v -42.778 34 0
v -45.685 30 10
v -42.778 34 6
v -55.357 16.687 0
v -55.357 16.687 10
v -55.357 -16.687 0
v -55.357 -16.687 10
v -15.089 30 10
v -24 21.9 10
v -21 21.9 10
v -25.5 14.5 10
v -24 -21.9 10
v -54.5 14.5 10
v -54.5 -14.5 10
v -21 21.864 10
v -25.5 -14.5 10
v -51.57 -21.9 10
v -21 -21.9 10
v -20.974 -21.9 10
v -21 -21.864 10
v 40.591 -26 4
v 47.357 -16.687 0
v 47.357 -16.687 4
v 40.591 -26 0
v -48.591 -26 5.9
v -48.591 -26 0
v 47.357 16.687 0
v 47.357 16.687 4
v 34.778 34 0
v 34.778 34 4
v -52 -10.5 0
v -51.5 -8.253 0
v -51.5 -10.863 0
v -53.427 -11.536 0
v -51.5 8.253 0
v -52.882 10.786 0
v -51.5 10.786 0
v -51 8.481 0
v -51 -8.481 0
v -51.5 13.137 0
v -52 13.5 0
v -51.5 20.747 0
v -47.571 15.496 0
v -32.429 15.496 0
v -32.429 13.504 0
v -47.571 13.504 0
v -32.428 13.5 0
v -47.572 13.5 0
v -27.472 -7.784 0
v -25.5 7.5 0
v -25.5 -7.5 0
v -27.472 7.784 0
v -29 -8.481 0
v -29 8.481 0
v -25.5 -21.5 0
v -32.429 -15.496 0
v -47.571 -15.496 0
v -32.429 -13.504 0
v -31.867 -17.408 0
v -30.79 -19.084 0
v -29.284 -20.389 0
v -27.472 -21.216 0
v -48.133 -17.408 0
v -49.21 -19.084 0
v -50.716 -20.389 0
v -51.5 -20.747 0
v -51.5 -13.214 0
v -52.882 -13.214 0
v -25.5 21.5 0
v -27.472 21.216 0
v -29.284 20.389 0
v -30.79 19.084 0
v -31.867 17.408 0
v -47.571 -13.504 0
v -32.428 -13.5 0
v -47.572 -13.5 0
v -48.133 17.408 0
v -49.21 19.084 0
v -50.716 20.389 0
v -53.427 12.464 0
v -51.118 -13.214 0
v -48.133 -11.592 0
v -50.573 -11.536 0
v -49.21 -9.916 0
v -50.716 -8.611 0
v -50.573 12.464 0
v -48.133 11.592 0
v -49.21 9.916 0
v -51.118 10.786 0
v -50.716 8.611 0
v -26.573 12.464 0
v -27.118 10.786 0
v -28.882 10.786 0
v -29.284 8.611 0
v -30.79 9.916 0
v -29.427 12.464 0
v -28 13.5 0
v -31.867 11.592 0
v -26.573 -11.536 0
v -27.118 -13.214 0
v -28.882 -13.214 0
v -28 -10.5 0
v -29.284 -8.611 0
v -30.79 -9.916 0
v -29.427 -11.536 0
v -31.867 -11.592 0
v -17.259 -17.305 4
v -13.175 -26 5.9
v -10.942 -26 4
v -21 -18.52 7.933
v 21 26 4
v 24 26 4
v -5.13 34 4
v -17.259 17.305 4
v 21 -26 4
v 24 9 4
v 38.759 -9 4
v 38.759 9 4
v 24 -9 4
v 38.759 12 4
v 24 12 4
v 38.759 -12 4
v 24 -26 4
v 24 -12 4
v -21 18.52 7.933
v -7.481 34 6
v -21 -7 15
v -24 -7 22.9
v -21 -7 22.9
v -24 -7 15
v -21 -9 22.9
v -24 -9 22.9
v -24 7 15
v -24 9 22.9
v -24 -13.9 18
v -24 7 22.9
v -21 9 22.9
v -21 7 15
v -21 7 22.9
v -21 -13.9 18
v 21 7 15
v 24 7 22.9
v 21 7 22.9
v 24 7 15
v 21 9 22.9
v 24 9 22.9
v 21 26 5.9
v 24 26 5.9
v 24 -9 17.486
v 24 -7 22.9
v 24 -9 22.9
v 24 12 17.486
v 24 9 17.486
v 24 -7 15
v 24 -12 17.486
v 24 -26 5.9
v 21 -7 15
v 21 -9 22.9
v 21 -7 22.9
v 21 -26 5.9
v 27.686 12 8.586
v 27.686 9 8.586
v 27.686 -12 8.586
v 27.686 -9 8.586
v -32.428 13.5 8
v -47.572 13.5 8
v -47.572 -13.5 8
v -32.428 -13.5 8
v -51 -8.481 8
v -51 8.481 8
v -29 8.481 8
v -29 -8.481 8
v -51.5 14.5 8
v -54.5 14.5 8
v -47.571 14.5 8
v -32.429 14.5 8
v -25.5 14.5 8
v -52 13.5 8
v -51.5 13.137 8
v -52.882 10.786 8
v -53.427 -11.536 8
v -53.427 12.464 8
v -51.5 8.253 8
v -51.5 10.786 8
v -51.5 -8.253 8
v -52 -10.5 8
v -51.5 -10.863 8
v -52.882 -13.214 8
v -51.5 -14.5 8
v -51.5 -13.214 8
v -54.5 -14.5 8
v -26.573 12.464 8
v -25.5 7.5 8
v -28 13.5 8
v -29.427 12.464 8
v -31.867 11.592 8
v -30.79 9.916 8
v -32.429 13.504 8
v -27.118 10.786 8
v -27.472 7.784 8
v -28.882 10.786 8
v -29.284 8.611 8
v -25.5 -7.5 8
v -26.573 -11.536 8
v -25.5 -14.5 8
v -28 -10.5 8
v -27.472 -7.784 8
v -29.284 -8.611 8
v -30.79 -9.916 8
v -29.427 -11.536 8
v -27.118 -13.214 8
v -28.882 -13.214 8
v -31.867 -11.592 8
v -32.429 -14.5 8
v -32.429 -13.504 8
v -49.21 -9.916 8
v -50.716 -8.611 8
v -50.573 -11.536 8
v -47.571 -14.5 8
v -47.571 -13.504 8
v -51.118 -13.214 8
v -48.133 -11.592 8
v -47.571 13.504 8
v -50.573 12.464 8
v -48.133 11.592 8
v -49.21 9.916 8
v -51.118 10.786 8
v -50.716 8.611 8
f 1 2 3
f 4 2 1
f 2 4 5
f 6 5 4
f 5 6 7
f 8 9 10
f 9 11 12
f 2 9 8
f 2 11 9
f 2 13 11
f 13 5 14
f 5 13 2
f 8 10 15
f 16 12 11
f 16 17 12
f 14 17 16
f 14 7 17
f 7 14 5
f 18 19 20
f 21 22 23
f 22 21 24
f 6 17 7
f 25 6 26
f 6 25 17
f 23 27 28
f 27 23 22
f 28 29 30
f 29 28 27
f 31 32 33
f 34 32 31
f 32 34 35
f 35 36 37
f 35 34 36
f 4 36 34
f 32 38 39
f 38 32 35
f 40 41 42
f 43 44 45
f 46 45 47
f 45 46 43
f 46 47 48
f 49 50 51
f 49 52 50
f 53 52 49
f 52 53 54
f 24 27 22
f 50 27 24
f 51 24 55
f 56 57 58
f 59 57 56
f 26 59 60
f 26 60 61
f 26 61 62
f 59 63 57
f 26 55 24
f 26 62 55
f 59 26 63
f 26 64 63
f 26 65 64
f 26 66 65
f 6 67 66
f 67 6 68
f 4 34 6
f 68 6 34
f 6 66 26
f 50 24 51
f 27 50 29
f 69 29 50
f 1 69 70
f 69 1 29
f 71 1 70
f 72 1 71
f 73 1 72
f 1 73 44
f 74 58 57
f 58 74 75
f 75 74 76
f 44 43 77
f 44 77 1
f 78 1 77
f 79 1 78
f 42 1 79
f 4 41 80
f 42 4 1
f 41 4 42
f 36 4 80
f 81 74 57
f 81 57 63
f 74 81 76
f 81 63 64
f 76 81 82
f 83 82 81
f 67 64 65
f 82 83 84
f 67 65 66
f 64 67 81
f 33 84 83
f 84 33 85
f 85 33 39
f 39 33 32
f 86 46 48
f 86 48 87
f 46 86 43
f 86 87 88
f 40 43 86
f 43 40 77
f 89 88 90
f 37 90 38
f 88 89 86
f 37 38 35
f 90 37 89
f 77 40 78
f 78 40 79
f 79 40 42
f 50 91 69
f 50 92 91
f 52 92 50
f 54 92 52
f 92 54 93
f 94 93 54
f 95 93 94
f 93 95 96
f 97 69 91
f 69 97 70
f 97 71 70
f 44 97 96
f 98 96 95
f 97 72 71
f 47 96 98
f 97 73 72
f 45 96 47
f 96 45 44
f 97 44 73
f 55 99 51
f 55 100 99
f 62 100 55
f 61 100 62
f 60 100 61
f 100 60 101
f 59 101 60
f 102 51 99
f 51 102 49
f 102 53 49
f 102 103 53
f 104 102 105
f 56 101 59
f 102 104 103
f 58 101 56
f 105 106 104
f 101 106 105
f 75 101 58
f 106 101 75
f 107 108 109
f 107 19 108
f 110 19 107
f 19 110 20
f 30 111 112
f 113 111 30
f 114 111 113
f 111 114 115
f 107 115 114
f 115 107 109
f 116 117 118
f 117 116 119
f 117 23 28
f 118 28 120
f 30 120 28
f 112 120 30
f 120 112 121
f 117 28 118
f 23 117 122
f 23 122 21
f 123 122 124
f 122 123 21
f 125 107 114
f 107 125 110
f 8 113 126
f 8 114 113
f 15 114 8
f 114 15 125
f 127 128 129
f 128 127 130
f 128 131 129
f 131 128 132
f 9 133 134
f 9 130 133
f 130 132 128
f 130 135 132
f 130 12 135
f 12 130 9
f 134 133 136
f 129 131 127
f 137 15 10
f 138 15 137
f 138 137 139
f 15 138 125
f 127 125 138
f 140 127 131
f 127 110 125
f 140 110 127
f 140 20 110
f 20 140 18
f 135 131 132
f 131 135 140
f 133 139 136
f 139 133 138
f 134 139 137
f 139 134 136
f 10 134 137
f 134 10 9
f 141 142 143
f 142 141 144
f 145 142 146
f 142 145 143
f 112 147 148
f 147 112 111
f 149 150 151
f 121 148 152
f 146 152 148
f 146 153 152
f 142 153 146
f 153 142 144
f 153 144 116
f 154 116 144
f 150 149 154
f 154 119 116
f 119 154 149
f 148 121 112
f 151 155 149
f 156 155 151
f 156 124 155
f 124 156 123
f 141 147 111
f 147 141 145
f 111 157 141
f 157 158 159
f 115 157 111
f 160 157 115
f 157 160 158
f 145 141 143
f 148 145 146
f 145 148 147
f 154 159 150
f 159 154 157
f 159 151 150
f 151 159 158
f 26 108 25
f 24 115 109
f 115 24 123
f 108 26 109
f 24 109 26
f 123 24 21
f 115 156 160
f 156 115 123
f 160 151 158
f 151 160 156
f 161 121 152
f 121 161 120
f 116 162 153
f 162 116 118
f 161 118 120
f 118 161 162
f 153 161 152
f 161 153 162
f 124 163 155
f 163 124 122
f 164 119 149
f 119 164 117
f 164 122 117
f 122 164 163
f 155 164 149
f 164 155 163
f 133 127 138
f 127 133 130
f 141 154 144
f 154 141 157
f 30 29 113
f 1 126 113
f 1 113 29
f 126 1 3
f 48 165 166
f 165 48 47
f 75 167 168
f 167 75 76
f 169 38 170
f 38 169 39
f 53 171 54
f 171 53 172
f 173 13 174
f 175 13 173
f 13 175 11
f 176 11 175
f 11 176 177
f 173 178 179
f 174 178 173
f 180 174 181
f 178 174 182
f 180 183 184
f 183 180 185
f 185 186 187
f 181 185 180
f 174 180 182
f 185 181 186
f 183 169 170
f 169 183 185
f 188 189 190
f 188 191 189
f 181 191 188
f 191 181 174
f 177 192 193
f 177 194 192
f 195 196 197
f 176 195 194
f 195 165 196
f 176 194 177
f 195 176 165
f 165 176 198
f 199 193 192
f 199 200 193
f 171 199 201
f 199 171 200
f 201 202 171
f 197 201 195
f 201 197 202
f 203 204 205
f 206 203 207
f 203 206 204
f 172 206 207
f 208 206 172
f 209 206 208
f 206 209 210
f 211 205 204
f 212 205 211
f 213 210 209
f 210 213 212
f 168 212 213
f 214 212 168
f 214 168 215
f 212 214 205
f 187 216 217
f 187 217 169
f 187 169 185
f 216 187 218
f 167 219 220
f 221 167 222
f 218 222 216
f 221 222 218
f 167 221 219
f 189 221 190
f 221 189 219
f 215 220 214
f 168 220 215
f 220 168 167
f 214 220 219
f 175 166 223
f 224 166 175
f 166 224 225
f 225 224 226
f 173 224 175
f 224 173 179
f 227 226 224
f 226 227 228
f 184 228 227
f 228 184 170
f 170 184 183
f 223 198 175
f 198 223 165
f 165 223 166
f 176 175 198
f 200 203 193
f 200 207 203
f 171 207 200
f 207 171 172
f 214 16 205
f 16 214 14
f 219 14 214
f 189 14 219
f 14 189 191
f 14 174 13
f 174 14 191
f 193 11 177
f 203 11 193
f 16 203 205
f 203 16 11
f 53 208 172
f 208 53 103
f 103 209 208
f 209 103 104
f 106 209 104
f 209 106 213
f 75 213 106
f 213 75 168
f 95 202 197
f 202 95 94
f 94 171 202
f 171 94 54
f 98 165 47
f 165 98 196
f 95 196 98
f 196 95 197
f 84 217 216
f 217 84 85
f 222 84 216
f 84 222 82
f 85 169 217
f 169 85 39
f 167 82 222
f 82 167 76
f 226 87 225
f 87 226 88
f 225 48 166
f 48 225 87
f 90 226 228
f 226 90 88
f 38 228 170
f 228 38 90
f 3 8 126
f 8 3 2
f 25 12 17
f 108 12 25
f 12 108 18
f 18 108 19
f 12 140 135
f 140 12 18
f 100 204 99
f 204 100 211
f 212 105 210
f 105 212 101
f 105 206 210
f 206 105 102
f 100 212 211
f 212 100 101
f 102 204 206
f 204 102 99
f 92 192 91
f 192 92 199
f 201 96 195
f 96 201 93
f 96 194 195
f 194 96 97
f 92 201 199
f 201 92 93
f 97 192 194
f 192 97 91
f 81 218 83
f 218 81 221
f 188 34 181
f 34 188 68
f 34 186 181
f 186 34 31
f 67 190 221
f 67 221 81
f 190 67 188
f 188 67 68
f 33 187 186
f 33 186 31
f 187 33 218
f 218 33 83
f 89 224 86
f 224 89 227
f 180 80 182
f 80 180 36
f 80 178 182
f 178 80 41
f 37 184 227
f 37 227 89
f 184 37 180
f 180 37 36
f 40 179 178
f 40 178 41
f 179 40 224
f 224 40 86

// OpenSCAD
module sensor(){

cube([28.4,28.4,6]);

	
}

module bracket(){
	//translate([0,0,25])rotate([90,0,0])import_stl("F2.stl");
}

module refuerzo(){
	difference(){
		translate([0,0,0])cube([16,3,16]);
		translate([0,5,16])rotate([90,0,0])cylinder(r=16,h=8,$fn=8);
		translate([-50,-50,14])cube(100);
	}
}

module refuerzo2(){
	difference(){
		translate([1,0,0])cube([19,3,19]);
		translate([-18,5,23])rotate([90,0,0])cylinder(r=40,h=8,$fn=4);
		//translate([-50,-50,17])cube(100);
	}
}

module agujero(){
	translate(0,0-1)cylinder(r=4,h=8);
}

x=27;
y=22;

rotate([0,0,90])
difference(){
union(){
difference()
{
	union(){
		difference(){
			translate([0,4,0])cylinder(r=54,h=10, $fn=10);
			translate([0,-36,4])cylinder(r2=76,r1=56,h=20, $fn=10);
			}
			
		bracket();
		translate([-27,21,3.9])refuerzo2();
		mirror([1,0,0])translate([-27,21,3.9])refuerzo2();
		mirror([0,1,0])mirror([1,0,0])translate([-27,21,3.9])refuerzo2();
		mirror([0,1,0])translate([-27,21,3.9])refuerzo2();

		translate([-12,21,0])cube([24,3,15]);
		mirror([0,1,0])translate([-12,21,0])cube([24,3,15]);

		rotate([0,0,90])mirror([0,1,0])translate([-39,9,3.9])refuerzo();
		mirror([1,0,0])rotate([0,0,90])mirror([0,1,0])translate([-39,9,3.9])refuerzo();
	}

	translate([34,-50,0])cube([60,100,10]);
	mirror([1,0,0])translate([26,-50,0])cube([60,100,10]);
	

	translate([-x/2,40-y/2,-1])cube([x,y,15]);
	translate([-29/2,40-29/2,8])cube([29,29,5]);

	
	translate([-100,-100,-200])cube(200);


	
}
//union
	difference(){
	translate([-29/2,40-29/2,0])cylinder(r=7,h=8);
	translate([-29/2-50,40-29/2-100,0])cube(100);
	}
	difference(){
	translate([-29/2+29,40-29/2,0])cylinder(r=7,h=8);
	translate([-29/2-50+29,40-29/2-100,0])cube(100);
	}
	difference(){
	translate([-29/2,40-29/2+29,0])cylinder(r=7,h=8);
	translate([-29/2-50,40-29/2+26,0])cube(100);
	}
	difference(){
	translate([-29/2+29,40-29/2+29,0])cylinder(r=7,h=8);
	translate([-29/2-50,40-29/2+26,0])cube(100);
	}



}
//diff
translate([42,0,18])rotate([0,90,90])cylinder(r=20,h=120,$fn=4);
translate([-33.9,0,18])rotate([0,90,90])cylinder(r=20,h=120,$fn=4);

	translate([-29/2+2.5,40-29/2+2.5,-1])cylinder(r=1.5,h=10);
	

	translate([-29/2+29-2.5,40-29/2+2.5,-1])cylinder(r=1.5,h=10);
	
	translate([-29/2+2.5,40-29/2+29-2.5,-1])cylinder(r=1.5,h=10);
	
	translate([-29/2+29-2.5,40-29/2+29-2.5,-1])cylinder(r=1.5,h=10);
	

}

//sensor();
